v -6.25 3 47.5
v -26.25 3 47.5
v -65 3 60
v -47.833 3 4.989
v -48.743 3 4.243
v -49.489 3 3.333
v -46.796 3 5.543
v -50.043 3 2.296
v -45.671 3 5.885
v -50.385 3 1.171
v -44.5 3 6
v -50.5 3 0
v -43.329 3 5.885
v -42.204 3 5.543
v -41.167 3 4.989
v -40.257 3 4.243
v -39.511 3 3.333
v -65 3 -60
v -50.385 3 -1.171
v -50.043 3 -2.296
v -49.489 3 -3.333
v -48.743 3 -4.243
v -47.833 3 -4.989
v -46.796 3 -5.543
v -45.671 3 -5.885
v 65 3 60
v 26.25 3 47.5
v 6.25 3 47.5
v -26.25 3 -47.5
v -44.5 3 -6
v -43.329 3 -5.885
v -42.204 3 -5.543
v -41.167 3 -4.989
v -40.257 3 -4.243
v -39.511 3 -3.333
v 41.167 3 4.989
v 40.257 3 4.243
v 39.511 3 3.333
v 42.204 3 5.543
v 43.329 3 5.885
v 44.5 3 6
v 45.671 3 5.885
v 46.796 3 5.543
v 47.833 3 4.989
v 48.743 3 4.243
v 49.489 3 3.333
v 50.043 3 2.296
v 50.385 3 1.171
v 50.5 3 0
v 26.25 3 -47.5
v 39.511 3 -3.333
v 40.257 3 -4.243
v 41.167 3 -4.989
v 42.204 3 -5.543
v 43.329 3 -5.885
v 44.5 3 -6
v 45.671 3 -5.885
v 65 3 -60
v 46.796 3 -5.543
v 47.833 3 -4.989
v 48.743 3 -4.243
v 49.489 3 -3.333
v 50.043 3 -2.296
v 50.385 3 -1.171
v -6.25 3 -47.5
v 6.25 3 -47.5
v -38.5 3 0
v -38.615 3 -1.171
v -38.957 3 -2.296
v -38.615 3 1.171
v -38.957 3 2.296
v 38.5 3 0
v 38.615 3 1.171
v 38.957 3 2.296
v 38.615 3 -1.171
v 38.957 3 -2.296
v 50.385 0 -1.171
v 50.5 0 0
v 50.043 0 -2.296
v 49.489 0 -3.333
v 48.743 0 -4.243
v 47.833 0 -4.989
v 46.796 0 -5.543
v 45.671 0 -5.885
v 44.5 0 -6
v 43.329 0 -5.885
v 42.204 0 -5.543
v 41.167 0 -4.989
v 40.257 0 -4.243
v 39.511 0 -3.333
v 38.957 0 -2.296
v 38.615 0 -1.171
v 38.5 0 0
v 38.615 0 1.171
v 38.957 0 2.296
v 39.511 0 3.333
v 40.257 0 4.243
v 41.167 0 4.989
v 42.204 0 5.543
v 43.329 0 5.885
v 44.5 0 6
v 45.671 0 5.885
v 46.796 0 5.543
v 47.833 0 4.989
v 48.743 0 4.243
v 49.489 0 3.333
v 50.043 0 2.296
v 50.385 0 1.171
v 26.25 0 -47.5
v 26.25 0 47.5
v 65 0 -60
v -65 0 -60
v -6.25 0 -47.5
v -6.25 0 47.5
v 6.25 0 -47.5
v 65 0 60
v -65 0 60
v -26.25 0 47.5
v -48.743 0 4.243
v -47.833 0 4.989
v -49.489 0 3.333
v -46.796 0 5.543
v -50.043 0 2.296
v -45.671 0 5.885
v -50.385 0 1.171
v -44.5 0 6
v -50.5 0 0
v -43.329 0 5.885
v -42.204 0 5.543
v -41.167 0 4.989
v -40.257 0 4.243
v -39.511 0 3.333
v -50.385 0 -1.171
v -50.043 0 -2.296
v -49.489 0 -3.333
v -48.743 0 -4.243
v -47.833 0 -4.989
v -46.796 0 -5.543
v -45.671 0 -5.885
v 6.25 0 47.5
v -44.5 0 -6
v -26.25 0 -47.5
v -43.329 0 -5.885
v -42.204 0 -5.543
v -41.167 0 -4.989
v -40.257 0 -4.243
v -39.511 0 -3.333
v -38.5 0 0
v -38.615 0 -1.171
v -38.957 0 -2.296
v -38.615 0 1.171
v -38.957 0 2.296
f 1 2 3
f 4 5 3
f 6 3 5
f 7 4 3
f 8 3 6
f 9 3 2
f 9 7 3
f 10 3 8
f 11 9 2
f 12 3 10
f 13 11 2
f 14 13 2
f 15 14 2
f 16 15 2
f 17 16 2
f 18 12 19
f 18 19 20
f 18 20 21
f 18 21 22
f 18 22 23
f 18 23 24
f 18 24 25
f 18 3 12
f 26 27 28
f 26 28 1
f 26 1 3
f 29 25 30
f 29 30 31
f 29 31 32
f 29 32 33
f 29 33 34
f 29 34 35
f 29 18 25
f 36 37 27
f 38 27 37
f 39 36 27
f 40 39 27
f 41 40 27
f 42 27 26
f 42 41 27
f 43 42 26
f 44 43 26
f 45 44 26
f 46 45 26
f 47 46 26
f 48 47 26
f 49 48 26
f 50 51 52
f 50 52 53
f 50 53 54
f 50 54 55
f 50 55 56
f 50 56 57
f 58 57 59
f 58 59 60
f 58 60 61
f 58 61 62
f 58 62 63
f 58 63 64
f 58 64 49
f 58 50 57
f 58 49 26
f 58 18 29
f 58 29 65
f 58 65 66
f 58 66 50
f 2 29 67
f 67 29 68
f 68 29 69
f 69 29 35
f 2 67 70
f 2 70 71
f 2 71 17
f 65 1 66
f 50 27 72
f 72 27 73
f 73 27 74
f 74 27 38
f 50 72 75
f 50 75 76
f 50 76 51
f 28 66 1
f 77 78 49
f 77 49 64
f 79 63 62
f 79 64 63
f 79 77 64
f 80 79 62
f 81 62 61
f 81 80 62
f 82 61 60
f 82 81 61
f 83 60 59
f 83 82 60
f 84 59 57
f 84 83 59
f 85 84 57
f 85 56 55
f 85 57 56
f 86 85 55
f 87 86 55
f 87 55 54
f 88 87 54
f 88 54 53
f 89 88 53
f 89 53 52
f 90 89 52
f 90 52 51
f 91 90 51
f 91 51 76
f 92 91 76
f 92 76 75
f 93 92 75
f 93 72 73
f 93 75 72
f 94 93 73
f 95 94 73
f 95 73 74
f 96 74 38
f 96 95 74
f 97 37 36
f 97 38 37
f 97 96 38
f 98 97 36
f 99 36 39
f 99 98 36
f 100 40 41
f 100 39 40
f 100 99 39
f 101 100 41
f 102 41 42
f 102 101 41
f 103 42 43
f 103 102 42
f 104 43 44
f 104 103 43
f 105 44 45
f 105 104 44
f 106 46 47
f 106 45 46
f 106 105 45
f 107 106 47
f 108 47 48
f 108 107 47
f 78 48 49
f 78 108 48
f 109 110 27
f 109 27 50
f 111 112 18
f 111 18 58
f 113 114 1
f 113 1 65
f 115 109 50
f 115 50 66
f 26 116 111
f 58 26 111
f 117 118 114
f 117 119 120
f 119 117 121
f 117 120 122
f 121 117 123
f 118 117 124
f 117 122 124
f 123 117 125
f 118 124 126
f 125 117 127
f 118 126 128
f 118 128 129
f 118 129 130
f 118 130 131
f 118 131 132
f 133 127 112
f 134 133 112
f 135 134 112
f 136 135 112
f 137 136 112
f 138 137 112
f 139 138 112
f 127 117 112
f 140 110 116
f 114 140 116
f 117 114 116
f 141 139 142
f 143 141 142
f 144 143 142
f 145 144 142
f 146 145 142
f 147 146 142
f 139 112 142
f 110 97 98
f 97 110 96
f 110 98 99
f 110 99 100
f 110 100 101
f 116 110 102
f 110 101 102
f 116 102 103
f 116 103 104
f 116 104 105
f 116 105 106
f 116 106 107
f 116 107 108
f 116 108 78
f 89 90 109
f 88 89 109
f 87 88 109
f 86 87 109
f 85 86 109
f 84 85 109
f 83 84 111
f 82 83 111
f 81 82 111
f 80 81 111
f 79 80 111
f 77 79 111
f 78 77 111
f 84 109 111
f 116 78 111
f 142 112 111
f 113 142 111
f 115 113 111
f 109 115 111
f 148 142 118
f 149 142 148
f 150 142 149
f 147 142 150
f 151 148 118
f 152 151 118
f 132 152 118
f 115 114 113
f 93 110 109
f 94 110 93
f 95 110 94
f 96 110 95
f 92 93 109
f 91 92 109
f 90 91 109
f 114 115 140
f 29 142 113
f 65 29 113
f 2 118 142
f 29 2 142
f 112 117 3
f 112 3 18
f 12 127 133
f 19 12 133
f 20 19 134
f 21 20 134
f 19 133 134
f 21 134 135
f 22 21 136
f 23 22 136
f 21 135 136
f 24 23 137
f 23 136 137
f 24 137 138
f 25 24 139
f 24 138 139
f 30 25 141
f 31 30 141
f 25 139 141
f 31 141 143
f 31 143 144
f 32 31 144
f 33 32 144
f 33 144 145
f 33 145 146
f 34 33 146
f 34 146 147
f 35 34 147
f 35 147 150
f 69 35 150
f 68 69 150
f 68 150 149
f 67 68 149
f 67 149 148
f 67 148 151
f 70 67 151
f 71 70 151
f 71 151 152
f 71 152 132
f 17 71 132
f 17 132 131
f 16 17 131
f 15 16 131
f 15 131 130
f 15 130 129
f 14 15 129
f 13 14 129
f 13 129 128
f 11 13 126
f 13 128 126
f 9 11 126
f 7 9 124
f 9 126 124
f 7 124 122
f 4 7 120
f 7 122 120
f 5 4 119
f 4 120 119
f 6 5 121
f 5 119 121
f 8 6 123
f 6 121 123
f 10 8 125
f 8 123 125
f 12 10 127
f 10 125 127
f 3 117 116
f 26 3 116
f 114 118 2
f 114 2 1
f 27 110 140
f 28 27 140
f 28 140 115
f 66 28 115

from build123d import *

# Parameters (mm, degrees)
SKETCH1_W           = 130
SKETCH1_H           = 120
BOSS_EXTRUDE1_DEPTH = 3
CUT_EXTRUDE1_START  = -4
SKETCH2_W           = 20
SKETCH2_H           = 95
CUT_EXTRUDE1_DEPTH  = 5
CUT_EXTRUDE2_START  = -4
SKETCH3_R           = 6
CUT_EXTRUDE2_DEPTH  = 5


with BuildPart() as part:
    # Sketch1 → Boss-Extrude1 (new body)
    with BuildSketch(Plane(origin=(0, 0, 0), x_dir=(1, 0, 0), z_dir=(0, 1, 0))):
        Rectangle(SKETCH1_W, SKETCH1_H)
    extrude(amount=BOSS_EXTRUDE1_DEPTH)

    # Sketch2 → Cut-Extrude1 (cut)
    with BuildSketch(Plane(origin=(0, 3, 0), x_dir=(1, 0, 0), z_dir=(0, 1, 0)).offset(CUT_EXTRUDE1_START)):
        with Locations((-16.25, 0)):
            Rectangle(SKETCH2_W, SKETCH2_H)
    cut_extrude1 = extrude(amount=CUT_EXTRUDE1_DEPTH, mode=Mode.SUBTRACT)

    # Mirror1: Cut-Extrude1 across plane
    add(cut_extrude1.mirror(Plane(origin=(0, 0, 0), x_dir=(0, 0, 1), z_dir=(1, 0, 0))), mode=Mode.SUBTRACT)

    # Sketch3 → Cut-Extrude2 (cut)
    with BuildSketch(Plane(origin=(0, 3, 0), x_dir=(1, 0, 0), z_dir=(0, 1, 0)).offset(CUT_EXTRUDE2_START)):
        with Locations((44.5, 0)):
            Circle(SKETCH3_R)
    cut_extrude2 = extrude(amount=CUT_EXTRUDE2_DEPTH, mode=Mode.SUBTRACT)

    # Mirror2: Cut-Extrude2 across plane
    add(cut_extrude2.mirror(Plane(origin=(0, 0, 0), x_dir=(0, 0, 1), z_dir=(1, 0, 0))), mode=Mode.SUBTRACT)


solid = part.part
